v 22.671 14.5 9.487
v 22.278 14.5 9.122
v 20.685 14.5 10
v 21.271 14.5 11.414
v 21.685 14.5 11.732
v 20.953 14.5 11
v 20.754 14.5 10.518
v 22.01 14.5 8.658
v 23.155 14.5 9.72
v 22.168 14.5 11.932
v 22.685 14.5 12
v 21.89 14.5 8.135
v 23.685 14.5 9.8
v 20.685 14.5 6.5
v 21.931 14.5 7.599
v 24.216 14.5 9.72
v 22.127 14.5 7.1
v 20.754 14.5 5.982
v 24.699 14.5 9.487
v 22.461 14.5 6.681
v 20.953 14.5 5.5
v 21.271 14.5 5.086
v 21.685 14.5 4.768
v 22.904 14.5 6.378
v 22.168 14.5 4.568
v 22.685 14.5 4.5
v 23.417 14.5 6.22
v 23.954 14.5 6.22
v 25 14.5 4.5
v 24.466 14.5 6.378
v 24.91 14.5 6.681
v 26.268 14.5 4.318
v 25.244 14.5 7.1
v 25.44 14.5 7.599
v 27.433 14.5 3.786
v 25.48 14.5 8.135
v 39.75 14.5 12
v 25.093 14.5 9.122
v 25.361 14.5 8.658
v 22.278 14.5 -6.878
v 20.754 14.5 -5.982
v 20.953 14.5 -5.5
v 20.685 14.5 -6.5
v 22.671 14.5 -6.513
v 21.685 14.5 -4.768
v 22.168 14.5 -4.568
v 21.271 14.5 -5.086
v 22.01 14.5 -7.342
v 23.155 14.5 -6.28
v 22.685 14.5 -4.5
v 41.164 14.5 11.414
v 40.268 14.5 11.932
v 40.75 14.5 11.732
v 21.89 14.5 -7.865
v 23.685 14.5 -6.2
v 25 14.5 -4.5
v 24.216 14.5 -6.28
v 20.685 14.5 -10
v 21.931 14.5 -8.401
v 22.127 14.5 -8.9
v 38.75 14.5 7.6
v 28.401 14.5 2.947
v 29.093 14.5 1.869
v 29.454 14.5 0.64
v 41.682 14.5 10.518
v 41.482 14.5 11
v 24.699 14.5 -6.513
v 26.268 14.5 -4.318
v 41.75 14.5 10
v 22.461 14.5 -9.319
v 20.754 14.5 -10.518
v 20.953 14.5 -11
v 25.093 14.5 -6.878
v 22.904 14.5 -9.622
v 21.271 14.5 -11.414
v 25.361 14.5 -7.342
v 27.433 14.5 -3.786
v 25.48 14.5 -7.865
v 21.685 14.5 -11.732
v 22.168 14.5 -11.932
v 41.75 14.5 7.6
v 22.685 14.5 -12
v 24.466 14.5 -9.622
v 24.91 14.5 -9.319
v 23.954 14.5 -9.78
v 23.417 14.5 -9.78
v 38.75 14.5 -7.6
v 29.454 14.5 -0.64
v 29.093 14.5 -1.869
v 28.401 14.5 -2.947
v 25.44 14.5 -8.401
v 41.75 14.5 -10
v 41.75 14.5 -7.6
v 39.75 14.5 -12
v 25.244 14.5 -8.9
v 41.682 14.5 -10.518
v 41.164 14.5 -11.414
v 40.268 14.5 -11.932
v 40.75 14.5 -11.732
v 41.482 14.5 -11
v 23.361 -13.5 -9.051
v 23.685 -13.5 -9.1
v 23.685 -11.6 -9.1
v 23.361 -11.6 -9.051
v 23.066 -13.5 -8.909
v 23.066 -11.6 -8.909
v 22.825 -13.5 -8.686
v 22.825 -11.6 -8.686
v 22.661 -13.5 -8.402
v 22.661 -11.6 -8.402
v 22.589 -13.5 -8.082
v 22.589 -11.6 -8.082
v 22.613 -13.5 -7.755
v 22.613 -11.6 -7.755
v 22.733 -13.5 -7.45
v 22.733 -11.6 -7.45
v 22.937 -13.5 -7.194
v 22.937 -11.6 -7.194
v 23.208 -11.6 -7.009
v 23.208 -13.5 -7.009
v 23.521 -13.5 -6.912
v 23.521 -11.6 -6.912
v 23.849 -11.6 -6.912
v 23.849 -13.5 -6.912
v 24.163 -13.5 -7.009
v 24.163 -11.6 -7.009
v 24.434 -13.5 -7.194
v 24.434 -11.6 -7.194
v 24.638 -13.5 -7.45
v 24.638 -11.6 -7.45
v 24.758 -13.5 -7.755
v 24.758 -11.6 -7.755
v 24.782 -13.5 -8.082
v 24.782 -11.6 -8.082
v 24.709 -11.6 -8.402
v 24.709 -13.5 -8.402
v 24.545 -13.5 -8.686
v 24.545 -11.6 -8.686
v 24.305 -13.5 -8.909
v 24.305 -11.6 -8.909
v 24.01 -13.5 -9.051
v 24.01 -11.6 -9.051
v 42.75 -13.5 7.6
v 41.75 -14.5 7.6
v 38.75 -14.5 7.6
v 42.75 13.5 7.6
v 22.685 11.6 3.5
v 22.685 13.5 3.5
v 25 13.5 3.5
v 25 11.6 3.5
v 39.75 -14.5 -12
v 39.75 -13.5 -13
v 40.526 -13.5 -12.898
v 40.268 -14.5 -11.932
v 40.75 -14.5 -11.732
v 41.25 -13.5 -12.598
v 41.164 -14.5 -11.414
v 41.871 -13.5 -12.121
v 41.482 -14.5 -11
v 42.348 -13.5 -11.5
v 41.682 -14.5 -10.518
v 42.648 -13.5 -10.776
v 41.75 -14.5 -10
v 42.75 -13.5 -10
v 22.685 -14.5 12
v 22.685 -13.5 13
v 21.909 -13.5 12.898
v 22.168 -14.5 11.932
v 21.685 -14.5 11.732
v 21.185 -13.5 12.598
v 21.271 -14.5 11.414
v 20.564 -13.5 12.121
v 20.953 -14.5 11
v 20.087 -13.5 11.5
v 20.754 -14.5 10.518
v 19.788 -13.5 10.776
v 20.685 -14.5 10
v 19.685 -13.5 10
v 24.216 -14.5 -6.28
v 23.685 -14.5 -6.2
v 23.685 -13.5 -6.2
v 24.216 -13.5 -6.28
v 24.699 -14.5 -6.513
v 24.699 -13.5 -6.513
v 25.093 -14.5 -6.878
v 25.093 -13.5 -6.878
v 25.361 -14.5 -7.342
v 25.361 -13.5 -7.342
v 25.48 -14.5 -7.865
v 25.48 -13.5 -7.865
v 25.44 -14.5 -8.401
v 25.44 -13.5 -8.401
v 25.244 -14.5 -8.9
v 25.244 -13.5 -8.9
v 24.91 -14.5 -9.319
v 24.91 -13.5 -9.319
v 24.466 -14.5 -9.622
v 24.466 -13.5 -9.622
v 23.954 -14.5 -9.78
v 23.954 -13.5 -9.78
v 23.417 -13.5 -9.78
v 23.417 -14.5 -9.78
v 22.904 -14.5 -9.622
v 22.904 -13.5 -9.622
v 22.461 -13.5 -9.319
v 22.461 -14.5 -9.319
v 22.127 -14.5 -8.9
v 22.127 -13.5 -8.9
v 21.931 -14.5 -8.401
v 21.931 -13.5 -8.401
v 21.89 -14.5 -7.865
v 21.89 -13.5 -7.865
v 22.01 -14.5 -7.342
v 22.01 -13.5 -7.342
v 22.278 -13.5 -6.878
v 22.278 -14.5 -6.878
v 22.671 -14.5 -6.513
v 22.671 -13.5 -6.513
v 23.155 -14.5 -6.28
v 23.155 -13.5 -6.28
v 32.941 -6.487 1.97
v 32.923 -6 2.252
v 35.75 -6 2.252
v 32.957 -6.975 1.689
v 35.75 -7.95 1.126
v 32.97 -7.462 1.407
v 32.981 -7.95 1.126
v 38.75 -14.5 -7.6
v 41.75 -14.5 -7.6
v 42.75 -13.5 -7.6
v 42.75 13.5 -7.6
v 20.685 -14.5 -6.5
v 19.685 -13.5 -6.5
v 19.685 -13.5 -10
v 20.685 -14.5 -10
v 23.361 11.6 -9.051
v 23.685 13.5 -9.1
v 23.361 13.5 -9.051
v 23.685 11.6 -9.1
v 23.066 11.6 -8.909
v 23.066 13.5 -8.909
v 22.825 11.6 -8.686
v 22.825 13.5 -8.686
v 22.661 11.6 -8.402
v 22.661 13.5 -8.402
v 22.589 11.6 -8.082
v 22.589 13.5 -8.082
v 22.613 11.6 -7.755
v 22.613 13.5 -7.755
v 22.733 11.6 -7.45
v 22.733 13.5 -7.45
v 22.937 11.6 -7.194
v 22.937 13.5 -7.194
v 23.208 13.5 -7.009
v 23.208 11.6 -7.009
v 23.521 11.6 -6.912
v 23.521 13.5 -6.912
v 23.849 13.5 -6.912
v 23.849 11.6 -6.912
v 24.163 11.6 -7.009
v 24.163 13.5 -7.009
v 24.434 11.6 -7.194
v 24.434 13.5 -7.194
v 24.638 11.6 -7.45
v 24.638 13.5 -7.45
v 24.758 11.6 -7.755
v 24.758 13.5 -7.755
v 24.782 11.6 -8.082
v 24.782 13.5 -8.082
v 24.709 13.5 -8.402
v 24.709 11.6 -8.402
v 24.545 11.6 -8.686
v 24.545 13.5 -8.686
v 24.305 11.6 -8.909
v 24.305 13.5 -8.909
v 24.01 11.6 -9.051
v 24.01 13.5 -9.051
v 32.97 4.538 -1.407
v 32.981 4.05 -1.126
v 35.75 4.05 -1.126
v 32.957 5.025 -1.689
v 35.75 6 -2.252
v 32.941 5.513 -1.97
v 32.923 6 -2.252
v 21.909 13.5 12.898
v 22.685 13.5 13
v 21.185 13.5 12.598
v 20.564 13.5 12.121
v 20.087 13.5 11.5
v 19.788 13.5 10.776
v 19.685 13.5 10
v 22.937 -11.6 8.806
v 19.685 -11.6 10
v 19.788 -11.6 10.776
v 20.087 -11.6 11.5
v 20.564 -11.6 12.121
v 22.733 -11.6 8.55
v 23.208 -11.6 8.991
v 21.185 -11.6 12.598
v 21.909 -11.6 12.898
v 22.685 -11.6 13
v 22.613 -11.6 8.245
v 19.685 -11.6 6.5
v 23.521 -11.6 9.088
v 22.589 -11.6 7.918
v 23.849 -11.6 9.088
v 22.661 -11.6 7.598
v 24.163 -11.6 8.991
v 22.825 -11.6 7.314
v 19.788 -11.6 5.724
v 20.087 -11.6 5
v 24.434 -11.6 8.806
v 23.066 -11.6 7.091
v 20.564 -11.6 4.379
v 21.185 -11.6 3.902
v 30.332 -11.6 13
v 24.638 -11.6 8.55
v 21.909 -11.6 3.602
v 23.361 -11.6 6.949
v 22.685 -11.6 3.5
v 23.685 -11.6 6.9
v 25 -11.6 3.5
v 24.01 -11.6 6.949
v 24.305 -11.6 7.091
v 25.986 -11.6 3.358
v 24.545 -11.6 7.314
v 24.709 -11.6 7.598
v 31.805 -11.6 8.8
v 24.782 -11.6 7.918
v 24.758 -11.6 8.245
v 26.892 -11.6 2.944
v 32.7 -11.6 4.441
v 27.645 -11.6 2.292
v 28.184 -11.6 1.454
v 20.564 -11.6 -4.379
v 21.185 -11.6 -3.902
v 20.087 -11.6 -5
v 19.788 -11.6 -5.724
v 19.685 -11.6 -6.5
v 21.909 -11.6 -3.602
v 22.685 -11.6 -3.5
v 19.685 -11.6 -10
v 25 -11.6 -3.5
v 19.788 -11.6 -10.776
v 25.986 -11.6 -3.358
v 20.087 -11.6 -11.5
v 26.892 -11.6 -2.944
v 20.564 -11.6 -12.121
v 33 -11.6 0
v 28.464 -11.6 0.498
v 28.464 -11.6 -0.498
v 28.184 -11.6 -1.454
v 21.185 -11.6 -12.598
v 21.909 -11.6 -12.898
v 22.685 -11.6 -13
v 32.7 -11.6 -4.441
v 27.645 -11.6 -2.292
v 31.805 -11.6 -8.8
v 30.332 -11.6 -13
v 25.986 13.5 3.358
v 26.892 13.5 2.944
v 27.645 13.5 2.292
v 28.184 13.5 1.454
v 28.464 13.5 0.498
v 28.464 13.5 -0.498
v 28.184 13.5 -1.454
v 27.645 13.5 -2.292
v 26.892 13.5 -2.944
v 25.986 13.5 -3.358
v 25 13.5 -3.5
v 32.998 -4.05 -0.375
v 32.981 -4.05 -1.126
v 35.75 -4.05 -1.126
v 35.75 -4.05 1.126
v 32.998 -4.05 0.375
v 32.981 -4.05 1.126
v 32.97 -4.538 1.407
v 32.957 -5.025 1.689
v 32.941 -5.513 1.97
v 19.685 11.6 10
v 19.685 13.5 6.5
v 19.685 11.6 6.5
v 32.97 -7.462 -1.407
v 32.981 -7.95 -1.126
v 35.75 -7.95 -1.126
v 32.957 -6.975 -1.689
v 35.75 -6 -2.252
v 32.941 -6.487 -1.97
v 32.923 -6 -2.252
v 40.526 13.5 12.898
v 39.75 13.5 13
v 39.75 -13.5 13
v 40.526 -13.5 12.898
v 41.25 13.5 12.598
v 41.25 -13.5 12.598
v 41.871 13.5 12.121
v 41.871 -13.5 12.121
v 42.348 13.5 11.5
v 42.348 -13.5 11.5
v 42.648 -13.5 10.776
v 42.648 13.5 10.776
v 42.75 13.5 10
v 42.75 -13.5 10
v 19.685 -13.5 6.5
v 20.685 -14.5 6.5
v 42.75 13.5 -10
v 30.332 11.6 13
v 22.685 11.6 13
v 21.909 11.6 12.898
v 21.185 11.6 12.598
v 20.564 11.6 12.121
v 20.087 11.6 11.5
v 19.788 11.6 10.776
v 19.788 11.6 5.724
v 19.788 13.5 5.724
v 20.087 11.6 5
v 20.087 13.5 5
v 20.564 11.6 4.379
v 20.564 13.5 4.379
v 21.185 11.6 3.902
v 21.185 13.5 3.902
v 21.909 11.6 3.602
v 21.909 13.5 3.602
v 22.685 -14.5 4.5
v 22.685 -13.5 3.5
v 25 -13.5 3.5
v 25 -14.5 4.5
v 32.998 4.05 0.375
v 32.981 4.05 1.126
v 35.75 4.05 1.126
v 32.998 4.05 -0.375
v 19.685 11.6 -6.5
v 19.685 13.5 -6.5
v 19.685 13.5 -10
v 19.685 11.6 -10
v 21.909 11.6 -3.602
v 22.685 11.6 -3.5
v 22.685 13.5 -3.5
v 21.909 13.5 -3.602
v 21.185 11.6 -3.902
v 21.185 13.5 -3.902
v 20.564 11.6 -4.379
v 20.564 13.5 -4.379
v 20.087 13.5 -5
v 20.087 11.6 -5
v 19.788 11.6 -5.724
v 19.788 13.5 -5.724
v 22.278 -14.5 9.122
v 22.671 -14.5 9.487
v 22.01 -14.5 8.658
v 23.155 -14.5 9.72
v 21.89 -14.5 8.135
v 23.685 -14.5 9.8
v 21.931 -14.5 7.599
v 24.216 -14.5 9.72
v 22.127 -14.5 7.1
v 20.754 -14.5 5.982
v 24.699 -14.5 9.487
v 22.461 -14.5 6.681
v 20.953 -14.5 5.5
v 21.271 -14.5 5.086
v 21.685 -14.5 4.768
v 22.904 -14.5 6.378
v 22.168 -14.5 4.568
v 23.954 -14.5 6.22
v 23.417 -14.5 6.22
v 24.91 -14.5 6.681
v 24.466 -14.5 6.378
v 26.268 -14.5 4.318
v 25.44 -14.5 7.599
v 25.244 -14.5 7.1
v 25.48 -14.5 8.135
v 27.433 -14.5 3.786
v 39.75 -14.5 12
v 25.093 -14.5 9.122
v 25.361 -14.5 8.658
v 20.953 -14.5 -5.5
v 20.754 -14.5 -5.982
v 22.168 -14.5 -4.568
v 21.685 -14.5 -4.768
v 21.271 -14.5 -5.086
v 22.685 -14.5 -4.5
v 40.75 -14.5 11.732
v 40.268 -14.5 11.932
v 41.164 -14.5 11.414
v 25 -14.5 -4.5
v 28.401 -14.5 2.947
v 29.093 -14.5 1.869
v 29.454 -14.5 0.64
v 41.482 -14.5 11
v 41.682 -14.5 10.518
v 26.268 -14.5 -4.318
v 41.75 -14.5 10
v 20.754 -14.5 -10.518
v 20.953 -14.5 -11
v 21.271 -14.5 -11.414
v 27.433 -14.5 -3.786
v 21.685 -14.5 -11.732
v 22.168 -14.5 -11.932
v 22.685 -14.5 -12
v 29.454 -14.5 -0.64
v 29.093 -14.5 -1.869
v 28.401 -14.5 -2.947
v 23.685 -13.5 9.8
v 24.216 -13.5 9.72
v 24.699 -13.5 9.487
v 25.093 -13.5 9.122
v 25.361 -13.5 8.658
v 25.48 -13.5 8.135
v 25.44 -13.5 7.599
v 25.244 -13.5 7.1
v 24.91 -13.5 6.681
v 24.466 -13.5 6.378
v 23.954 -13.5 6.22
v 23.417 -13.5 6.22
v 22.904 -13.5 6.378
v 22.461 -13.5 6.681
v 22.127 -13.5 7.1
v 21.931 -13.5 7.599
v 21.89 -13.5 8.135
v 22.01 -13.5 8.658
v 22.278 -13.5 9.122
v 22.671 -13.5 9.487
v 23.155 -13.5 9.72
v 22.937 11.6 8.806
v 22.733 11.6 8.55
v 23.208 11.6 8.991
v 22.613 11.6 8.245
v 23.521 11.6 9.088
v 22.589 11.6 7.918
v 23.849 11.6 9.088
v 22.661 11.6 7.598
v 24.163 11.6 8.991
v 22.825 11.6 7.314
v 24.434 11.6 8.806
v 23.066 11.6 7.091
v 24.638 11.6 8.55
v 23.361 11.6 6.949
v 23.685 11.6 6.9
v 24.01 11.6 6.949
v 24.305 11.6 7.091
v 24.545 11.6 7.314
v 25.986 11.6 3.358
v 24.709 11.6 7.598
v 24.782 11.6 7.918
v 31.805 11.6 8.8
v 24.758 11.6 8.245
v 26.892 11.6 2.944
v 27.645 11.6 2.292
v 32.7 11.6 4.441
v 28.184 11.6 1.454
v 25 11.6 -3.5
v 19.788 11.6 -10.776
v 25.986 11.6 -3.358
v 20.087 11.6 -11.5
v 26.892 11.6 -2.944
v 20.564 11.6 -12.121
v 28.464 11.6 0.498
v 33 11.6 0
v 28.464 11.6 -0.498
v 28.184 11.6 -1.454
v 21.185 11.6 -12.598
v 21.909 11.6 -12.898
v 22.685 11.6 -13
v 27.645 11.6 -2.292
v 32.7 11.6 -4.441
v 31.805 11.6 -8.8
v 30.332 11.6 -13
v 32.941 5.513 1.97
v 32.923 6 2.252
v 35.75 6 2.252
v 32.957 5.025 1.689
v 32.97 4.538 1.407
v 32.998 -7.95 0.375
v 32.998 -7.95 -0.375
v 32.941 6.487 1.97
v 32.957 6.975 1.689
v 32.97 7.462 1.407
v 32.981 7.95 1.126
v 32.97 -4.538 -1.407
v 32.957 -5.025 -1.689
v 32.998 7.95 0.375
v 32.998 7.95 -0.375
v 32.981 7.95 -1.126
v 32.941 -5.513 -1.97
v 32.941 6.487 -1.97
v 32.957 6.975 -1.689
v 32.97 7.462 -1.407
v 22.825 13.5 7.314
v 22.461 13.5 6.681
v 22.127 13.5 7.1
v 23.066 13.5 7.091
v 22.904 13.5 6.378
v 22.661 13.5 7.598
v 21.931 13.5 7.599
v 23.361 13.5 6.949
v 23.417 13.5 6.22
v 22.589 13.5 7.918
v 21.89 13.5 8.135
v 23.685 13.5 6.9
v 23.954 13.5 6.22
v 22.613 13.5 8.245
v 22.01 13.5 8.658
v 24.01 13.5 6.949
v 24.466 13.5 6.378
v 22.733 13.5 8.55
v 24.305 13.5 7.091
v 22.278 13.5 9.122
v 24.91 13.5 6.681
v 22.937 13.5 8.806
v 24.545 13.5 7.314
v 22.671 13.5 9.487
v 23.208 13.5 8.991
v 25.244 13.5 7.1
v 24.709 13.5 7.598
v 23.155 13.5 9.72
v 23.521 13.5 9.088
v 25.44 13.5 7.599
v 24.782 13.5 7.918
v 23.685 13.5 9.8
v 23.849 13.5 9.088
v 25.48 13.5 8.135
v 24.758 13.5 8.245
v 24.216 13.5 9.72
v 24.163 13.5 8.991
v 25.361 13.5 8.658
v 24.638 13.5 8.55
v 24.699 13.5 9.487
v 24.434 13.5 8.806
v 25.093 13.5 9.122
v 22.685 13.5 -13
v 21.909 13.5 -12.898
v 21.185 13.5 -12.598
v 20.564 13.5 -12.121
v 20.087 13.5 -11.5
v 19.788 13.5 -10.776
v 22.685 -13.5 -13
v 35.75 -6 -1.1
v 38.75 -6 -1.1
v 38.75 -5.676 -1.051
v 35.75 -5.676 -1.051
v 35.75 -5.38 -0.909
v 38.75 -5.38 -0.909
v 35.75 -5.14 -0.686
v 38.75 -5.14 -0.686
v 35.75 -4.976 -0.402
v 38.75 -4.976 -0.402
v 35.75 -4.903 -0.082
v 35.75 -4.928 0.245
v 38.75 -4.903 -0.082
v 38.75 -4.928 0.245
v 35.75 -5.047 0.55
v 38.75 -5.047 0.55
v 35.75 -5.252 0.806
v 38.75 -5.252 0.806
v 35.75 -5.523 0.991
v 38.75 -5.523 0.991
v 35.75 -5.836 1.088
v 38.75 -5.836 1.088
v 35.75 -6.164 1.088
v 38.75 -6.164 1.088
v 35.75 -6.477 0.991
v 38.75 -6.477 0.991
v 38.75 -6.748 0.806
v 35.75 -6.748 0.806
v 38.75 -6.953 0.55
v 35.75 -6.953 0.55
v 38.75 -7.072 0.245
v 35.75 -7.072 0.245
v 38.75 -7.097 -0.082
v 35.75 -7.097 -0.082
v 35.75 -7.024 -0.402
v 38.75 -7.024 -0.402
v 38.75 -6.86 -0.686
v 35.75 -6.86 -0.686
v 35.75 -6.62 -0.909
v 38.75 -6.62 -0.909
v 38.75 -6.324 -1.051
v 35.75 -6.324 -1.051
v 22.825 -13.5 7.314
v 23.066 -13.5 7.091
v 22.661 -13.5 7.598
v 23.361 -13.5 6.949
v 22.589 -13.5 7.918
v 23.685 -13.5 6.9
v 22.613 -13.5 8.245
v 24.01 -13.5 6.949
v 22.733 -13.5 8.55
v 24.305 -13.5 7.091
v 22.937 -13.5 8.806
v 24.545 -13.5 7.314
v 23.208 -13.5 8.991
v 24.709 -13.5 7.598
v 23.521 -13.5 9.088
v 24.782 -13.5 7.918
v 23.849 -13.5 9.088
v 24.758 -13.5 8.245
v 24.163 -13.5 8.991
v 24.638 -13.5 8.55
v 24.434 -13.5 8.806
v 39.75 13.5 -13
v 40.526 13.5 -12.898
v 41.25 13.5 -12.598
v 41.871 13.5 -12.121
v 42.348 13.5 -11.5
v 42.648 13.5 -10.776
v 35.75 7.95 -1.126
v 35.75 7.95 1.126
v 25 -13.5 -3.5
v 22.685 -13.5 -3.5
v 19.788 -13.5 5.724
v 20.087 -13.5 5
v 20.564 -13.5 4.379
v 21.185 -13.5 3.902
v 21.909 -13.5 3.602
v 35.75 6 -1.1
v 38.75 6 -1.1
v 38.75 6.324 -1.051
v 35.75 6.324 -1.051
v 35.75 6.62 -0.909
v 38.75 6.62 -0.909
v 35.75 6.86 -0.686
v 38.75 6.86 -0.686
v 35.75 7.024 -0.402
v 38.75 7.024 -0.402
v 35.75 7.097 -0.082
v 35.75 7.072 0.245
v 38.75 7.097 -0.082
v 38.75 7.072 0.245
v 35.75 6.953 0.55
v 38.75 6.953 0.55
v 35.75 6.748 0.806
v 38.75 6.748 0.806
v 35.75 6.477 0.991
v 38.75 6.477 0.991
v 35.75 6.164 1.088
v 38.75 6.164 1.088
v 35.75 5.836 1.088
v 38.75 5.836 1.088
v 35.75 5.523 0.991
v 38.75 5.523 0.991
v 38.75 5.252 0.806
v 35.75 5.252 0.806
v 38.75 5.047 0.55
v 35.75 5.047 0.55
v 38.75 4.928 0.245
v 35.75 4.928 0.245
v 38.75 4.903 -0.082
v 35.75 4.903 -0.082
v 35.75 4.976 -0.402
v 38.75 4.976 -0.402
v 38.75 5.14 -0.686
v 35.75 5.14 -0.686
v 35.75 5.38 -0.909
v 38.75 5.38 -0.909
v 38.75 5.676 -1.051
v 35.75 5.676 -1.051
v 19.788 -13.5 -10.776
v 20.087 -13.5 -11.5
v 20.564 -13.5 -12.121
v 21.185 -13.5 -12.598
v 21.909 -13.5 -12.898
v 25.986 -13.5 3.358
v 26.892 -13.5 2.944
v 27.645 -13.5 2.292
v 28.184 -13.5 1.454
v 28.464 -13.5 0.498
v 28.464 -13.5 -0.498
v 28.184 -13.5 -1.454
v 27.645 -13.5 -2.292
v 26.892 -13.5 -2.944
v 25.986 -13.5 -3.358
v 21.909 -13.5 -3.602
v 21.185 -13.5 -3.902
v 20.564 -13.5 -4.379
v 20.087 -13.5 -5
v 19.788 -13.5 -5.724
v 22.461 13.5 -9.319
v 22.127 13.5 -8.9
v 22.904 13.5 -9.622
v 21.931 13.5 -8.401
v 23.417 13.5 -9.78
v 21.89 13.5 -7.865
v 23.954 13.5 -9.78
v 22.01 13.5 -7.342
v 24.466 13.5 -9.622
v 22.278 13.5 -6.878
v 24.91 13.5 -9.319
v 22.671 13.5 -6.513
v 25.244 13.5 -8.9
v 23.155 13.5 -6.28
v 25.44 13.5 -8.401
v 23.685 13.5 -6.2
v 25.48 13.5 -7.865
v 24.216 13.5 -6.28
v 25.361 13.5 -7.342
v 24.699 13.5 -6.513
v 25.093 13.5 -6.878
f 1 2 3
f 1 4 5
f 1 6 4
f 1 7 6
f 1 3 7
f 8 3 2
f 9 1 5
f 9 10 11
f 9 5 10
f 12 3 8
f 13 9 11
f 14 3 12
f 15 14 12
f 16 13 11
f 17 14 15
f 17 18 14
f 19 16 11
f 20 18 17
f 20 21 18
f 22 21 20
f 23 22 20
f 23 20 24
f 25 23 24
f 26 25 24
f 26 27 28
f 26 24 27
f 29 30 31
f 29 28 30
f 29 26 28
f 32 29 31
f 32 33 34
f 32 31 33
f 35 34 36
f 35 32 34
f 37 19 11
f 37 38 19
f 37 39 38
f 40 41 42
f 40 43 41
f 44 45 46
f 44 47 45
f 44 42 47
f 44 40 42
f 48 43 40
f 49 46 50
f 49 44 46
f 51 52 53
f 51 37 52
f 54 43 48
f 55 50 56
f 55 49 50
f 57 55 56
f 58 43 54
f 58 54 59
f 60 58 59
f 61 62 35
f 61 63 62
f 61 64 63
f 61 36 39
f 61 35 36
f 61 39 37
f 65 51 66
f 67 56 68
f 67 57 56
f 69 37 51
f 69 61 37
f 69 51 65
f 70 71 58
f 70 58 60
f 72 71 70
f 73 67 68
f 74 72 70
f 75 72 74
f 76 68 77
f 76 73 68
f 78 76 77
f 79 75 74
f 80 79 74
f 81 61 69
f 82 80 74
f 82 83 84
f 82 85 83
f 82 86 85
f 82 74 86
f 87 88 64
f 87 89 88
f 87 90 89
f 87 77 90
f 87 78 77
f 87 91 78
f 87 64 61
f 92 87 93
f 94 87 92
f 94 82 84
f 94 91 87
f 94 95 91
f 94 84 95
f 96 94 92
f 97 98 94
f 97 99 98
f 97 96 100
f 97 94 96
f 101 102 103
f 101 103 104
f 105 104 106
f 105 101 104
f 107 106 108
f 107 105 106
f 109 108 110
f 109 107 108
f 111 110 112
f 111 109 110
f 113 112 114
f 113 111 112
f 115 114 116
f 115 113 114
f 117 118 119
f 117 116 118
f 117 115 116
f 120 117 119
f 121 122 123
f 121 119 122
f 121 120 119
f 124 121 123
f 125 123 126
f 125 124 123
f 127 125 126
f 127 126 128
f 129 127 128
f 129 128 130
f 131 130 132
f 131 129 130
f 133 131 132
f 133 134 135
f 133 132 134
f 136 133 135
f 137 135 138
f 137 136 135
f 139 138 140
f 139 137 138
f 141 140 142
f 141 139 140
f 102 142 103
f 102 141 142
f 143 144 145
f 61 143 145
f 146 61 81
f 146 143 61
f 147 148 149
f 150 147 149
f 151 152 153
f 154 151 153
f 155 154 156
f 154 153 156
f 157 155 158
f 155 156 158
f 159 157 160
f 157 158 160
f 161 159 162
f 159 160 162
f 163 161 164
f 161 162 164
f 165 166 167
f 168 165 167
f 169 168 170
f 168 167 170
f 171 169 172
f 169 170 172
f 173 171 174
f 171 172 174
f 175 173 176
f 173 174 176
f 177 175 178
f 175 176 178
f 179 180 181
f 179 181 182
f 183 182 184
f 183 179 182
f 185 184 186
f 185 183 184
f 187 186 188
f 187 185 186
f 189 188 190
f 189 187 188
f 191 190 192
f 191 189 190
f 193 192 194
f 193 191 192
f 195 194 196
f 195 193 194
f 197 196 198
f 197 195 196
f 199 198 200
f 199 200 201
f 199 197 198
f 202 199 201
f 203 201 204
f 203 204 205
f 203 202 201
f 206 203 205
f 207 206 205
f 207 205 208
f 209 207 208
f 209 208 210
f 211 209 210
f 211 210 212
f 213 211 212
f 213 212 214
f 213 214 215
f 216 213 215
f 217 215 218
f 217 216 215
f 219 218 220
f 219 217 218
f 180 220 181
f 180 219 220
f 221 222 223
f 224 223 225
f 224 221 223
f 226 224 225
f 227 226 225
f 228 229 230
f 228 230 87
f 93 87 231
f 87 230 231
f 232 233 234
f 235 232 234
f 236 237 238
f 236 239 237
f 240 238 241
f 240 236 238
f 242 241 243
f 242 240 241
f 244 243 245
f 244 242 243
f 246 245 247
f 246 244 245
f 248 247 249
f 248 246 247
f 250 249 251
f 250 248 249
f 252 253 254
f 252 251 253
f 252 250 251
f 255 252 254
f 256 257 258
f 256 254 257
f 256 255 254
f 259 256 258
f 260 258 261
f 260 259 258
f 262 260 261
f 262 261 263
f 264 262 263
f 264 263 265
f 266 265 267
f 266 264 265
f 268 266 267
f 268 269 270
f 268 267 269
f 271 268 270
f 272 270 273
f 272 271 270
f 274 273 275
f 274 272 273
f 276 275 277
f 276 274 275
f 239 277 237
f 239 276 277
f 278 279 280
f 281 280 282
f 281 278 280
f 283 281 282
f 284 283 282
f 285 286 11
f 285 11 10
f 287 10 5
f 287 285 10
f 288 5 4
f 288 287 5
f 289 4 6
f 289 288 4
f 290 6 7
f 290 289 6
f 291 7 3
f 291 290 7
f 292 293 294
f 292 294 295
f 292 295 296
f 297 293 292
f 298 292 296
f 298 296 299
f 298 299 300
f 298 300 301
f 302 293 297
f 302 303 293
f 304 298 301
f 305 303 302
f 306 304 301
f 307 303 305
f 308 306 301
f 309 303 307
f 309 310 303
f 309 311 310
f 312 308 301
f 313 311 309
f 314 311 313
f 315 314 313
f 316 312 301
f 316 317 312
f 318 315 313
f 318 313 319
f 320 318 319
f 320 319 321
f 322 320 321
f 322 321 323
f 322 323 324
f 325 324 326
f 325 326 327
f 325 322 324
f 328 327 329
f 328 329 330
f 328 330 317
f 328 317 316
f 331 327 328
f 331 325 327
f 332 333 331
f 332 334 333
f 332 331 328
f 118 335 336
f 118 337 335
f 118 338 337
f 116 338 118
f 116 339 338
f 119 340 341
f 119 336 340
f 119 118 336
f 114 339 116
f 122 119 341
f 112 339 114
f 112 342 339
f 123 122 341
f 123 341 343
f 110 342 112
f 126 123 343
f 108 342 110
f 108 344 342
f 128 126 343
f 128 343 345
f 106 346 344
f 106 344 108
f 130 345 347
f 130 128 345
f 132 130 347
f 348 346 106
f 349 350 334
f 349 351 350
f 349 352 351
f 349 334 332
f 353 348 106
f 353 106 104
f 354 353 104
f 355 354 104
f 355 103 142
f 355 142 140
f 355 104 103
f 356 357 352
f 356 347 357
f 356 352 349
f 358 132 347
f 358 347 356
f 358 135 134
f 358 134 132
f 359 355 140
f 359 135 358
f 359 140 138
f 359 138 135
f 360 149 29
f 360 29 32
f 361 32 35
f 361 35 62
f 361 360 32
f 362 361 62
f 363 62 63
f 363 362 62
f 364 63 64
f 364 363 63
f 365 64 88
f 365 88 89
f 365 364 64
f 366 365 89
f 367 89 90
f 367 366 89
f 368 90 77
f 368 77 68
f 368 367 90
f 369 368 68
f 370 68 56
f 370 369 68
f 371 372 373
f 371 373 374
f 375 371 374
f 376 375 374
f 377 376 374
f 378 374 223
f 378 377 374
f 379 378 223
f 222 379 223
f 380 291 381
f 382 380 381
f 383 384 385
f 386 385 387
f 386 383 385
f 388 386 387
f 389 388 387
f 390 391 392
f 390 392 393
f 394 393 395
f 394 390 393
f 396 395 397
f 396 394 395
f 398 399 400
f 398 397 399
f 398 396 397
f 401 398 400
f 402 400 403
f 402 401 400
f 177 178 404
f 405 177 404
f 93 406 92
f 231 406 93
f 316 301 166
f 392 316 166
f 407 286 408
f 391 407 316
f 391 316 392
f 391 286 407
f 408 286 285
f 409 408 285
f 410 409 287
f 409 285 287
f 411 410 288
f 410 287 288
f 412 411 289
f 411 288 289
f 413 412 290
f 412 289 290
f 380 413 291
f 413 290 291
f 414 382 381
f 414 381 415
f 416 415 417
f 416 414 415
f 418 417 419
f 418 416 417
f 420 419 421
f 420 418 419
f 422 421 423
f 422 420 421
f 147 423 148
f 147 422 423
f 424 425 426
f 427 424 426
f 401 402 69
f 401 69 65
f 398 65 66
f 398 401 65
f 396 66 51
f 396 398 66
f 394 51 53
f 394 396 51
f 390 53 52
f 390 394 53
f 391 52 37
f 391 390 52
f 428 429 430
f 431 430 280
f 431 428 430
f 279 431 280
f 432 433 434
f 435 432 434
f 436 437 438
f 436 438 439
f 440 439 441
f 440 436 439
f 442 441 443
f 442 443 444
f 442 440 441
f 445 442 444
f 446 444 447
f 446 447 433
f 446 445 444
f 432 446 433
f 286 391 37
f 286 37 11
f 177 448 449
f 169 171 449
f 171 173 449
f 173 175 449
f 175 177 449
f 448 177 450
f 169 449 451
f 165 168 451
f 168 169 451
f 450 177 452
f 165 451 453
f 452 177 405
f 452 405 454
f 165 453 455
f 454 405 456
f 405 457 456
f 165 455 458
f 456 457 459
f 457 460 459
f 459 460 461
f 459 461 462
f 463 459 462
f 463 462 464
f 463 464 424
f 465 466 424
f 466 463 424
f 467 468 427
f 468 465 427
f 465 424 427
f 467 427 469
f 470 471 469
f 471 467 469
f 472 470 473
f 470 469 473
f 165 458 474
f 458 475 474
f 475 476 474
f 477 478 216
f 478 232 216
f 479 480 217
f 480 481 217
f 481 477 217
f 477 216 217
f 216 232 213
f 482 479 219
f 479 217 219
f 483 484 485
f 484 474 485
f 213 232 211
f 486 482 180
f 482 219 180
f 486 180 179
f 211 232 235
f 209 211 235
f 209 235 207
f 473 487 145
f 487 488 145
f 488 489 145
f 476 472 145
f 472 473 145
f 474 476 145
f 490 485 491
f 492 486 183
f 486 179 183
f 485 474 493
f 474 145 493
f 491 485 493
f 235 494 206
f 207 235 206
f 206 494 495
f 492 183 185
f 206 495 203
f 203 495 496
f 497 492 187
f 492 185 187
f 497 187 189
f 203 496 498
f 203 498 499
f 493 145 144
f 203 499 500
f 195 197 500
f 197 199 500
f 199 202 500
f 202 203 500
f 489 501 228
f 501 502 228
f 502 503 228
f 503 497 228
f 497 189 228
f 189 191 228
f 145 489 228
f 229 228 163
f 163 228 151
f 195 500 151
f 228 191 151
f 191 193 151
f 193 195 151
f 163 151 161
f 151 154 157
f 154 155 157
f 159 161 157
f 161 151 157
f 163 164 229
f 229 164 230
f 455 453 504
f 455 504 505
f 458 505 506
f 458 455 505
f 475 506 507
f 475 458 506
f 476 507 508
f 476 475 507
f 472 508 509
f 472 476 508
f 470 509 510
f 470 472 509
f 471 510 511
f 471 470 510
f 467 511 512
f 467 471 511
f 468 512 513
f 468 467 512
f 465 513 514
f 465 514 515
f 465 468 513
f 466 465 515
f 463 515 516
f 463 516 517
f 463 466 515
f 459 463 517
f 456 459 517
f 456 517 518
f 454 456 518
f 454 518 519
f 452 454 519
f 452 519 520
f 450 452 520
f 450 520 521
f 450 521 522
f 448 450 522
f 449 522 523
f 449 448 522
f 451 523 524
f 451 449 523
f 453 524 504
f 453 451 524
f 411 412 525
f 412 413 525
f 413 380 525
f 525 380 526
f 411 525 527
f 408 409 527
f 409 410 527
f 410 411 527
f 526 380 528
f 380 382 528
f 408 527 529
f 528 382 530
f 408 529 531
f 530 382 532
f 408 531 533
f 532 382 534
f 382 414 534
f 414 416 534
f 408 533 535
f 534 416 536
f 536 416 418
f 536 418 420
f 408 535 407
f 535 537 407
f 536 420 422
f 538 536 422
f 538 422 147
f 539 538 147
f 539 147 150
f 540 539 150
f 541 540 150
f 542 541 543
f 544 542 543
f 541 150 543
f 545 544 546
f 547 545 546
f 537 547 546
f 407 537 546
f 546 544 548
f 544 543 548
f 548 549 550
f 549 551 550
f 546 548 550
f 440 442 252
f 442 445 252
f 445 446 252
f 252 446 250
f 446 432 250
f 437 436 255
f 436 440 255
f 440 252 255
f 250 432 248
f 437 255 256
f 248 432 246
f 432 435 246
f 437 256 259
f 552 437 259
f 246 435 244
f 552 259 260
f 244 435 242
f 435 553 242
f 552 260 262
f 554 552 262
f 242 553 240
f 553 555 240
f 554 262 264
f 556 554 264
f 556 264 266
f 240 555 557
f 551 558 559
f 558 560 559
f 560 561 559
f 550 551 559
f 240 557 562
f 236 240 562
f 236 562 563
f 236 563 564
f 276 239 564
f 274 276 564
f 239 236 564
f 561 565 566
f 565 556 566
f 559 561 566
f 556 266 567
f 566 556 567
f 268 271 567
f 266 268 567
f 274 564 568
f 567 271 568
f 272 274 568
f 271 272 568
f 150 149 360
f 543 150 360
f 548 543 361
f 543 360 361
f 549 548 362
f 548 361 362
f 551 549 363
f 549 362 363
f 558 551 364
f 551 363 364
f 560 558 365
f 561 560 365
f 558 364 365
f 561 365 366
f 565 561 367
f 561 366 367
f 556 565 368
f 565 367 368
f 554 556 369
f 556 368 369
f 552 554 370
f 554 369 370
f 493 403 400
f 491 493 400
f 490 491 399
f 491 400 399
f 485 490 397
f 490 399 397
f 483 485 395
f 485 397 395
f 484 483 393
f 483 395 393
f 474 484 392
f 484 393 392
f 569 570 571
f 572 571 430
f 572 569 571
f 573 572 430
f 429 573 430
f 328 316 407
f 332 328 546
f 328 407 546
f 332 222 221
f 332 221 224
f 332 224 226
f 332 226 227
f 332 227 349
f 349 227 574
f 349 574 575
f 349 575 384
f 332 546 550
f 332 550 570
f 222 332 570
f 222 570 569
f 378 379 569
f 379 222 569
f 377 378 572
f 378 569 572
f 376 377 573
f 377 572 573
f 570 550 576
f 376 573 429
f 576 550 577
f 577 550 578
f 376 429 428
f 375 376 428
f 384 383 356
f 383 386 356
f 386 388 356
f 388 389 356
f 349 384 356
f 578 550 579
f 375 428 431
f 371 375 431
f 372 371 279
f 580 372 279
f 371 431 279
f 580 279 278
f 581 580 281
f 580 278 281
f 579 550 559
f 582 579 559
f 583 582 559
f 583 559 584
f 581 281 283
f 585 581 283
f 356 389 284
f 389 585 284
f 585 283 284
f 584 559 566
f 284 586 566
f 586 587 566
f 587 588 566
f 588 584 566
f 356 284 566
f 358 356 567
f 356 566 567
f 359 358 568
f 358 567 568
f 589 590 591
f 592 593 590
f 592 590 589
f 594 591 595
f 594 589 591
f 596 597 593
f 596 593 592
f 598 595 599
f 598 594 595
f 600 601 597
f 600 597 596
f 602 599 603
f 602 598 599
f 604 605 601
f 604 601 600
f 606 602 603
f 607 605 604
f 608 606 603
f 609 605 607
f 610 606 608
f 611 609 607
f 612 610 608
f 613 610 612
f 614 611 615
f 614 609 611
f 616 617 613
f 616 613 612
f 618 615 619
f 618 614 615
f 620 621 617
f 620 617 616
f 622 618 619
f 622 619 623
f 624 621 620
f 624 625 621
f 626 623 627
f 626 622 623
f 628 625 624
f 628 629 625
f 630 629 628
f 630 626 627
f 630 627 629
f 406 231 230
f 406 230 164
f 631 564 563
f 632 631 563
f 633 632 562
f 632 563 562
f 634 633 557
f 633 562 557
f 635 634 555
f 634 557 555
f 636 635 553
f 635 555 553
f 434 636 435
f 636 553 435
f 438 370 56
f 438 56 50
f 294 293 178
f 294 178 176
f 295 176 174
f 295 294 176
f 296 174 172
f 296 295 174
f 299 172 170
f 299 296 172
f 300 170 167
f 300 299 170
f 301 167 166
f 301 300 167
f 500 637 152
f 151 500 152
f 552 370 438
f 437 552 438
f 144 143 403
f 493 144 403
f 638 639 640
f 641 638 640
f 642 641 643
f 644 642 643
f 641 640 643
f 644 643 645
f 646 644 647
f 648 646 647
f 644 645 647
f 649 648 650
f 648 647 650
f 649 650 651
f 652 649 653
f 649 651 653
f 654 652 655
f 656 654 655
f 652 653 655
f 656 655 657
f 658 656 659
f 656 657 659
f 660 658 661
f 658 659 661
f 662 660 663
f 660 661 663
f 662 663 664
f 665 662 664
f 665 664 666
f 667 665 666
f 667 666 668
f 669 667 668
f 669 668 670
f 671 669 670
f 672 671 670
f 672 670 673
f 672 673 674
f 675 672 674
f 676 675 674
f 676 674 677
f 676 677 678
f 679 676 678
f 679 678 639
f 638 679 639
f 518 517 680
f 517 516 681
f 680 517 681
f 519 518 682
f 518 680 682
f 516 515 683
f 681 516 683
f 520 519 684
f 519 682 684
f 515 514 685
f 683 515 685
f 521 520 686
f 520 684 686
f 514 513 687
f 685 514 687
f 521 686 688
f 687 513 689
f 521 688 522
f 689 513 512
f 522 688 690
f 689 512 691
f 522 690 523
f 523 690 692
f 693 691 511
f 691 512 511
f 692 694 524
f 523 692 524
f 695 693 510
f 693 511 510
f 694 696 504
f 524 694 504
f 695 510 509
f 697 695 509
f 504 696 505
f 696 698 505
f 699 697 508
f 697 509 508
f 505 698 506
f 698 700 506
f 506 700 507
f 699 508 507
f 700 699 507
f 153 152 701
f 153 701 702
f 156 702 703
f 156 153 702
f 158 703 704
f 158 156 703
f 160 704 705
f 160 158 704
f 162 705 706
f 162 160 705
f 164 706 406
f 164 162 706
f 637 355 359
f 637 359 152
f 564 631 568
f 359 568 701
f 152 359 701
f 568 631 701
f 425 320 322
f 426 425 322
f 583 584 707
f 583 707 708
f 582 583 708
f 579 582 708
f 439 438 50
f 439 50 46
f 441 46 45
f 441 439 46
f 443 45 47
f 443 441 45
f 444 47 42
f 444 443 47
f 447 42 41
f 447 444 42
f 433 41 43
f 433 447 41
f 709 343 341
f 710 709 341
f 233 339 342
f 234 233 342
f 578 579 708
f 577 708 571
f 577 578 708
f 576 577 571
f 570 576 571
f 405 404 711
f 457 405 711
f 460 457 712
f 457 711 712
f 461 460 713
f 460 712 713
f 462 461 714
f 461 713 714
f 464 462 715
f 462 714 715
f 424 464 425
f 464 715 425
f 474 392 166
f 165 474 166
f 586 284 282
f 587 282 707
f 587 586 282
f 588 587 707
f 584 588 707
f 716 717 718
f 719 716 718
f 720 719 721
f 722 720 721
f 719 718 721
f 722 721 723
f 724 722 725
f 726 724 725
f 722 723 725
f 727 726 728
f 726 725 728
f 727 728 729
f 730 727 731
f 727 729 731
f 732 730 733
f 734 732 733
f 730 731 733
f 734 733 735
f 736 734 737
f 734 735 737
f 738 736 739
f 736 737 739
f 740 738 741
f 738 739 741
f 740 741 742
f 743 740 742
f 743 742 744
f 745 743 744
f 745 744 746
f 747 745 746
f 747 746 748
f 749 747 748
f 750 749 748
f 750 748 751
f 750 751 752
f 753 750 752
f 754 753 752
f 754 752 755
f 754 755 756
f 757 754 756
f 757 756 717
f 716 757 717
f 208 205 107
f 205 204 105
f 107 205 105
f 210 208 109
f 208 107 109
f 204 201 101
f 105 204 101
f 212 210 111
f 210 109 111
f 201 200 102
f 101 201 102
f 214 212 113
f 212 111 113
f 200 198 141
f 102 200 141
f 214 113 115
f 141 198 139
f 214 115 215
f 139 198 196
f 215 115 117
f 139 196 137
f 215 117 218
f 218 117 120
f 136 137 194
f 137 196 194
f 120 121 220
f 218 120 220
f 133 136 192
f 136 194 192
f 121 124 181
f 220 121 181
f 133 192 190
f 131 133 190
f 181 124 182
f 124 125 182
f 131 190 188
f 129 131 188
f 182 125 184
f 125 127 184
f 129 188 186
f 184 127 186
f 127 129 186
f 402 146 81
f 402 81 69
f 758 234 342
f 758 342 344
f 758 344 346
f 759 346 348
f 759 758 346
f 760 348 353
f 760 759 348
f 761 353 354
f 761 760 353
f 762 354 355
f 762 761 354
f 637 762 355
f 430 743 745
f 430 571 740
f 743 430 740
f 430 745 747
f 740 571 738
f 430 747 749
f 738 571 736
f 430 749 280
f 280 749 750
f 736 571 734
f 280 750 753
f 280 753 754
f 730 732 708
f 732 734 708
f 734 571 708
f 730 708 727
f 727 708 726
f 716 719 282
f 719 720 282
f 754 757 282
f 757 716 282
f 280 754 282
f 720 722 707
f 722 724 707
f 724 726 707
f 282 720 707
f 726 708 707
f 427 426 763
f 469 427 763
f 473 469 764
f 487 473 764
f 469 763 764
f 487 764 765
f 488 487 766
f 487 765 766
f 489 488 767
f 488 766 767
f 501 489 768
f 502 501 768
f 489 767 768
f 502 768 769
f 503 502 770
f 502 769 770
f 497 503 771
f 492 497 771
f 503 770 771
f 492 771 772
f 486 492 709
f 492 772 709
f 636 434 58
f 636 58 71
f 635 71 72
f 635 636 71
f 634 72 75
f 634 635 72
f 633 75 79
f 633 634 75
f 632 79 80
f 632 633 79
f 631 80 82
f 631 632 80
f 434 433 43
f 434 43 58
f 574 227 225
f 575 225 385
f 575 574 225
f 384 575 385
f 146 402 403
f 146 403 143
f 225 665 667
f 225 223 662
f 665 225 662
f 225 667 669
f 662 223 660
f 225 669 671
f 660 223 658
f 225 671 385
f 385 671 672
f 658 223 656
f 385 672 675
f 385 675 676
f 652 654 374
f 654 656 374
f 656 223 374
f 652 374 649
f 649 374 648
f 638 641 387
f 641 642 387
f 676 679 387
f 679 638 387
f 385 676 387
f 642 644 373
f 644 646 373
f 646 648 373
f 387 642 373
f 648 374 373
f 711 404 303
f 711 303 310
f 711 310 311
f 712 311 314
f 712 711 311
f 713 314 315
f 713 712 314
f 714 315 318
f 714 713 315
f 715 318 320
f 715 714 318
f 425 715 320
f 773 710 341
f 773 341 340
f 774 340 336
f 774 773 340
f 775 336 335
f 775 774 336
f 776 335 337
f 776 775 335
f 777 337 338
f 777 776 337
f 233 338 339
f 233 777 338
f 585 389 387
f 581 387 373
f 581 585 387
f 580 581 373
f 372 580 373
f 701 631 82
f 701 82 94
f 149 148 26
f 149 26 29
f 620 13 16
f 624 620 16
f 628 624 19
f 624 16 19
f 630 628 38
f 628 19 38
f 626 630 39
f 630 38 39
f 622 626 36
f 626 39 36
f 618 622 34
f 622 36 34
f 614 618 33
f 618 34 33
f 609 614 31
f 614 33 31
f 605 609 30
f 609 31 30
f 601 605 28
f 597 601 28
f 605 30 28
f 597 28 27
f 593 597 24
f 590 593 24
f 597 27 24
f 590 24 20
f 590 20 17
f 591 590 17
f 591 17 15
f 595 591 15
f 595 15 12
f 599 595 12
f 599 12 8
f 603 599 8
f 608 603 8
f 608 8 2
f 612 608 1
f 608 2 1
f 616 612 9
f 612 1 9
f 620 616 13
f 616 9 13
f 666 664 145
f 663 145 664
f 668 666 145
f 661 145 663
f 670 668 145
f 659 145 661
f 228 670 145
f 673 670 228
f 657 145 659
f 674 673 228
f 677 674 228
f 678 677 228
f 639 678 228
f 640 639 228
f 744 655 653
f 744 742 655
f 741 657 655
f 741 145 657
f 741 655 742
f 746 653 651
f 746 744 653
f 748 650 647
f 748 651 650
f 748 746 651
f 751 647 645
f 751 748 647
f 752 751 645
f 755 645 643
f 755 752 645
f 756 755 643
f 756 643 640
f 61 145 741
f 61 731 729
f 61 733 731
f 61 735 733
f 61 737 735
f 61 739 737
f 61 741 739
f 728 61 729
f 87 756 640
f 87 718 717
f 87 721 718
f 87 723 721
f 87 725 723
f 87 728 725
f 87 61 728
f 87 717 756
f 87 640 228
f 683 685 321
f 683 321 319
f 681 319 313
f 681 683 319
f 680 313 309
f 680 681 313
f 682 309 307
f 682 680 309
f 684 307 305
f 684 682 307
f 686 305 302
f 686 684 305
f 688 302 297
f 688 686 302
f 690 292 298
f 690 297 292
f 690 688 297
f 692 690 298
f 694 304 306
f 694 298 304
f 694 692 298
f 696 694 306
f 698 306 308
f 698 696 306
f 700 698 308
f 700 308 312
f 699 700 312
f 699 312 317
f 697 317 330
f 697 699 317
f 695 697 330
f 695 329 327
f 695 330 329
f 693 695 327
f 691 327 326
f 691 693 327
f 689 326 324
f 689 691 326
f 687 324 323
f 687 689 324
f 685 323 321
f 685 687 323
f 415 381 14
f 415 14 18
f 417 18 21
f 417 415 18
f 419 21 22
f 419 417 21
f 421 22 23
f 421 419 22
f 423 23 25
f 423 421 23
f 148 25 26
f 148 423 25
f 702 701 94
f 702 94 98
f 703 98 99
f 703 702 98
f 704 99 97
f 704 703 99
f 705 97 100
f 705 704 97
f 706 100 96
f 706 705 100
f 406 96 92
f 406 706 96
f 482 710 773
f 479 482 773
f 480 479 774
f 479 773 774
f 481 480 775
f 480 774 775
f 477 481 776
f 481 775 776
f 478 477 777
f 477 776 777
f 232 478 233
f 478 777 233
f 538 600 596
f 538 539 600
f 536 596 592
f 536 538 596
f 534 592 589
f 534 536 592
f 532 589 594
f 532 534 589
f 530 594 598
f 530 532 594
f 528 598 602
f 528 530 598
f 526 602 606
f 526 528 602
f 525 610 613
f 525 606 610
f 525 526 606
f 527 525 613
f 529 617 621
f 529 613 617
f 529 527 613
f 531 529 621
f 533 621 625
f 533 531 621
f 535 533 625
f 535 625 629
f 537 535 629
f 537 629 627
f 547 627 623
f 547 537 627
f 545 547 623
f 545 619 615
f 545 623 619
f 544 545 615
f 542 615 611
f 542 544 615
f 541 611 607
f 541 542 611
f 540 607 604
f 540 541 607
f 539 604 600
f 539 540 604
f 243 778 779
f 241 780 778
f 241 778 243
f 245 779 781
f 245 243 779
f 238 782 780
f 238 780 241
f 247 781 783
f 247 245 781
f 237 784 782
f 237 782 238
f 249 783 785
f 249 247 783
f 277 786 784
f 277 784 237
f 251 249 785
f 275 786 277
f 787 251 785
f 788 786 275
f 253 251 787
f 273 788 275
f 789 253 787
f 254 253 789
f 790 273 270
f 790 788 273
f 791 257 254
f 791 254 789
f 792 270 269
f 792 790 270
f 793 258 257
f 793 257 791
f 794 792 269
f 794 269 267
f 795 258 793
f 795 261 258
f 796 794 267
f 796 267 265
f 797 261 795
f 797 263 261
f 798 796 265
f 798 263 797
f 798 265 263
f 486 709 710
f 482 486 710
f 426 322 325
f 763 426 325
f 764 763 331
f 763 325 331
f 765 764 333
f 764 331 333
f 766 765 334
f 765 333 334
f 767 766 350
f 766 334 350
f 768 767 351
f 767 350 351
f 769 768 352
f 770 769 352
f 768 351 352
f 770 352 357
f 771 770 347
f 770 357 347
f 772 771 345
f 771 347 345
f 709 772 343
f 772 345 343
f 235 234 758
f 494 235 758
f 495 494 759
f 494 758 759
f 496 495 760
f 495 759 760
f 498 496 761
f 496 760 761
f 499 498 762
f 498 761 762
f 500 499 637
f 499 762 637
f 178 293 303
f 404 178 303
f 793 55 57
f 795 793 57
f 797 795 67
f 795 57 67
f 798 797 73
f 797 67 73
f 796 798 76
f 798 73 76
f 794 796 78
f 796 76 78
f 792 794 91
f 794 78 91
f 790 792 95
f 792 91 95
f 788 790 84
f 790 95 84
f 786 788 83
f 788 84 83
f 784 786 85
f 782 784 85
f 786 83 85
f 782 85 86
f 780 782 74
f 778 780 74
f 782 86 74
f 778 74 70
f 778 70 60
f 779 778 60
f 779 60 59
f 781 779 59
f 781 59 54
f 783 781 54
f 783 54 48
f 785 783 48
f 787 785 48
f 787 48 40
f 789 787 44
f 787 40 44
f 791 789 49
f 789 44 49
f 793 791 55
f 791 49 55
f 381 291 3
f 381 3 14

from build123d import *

# Parameters (mm, degrees)
SKETCH_2_W          = 23.064561435
SKETCH_2_H          = 26
SKETCH_2_R          = 1.1
EXTRUDE_1_DEPTH     = 14.5
SKETCH_3_R          = 33
CUT_EXTRUDE_1_DEPTH = 11.6
SKETCH_4_R          = 3.5
CUT_EXTRUDE_2_DEPTH = 54.268776032
SKETCH_5_W          = 15.2
SKETCH_5_H          = 29
CUT_EXTRUDE_3_DEPTH = 4
FILLET_1_R          = 3
SKETCH_6_R          = 1.1
CUT_EXTRUDE_4_DEPTH = 28.252660471
CHAMFER_1_SIZE      = 1
SKETCH_7_R          = 1.8
CUT_EXTRUDE_5_DEPTH = 1
CUT_EXTRUDE_6_DEPTH = 35.75


with BuildPart() as part:
    # Эскиз2 → Бобышка-Вытянуть1 (new, symmetric)
    with BuildSketch(Plane(origin=(0, 0, 0), x_dir=(1, 0, 0), z_dir=(0, 1, 0))):
        with Locations((31.217719282, 0)):
            Rectangle(SKETCH_2_W, SKETCH_2_H)
        with Locations(Location((23.685438565, 8, 0), (0, 0, 90))):
            Circle(SKETCH_2_R, mode=Mode.SUBTRACT)
        with Locations(Location((23.685438565, -8, 0), (0, 0, 90))):
            Circle(SKETCH_2_R, mode=Mode.SUBTRACT)
    extrude(amount=EXTRUDE_1_DEPTH, both=True)

    # Эскиз3 → Вырез-Вытянуть1 (cut, symmetric)
    with BuildSketch(Plane(origin=(0, 0, 0), x_dir=(1, 0, 0), z_dir=(0, 1, 0))):
        Circle(SKETCH_3_R)
    extrude(amount=CUT_EXTRUDE_1_DEPTH, both=True, mode=Mode.SUBTRACT)

    # Эскиз4 → Вырез-Вытянуть2 (cut, through all)
    with BuildSketch(Plane(origin=(0, 14.5, 0), x_dir=(1, 0, 0), z_dir=(0, 1, 0))):
        with Locations((25, 0)):
            Circle(SKETCH_4_R)
        with BuildLine():
            ThreePointArc((25, -3.5), (21.5, 0), (25, 3.5))
            Line((25, 3.5), (19.685438565, 3.5))
            Line((19.685438565, 3.5), (19.685438565, -3.5))
            Line((19.685438565, -3.5), (25, -3.5))
        make_face()
    extrude(amount=-CUT_EXTRUDE_2_DEPTH, mode=Mode.SUBTRACT)

    # Эскиз5 → Вырез-Вытянуть3 (cut)
    with BuildSketch(Plane(origin=(42.75, 0, 0), x_dir=(0, 0, -1), z_dir=(1, 0, 0))):
        Rectangle(SKETCH_5_W, SKETCH_5_H)
    extrude(amount=-CUT_EXTRUDE_3_DEPTH, mode=Mode.SUBTRACT)

    # Скругление1
    fillet_1_edges = [part.edges().sort_by_distance(p)[0] for p in [
        (19.685438565, -13.05, 13),
        (19.685438565, -13.05, -13),
        (19.685438565, 13.05, 3.5),
        (19.685438565, 13.05, -3.5),
        (19.685438565, -13.05, 3.5),
        (19.685438565, -13.05, -3.5),
        (42.75, 0, 13),
        (19.685438565, 13.05, 13),
        (19.685438565, 13.05, -13),
        (42.75, 0, -13),
    ]]
    fillet(fillet_1_edges, radius=FILLET_1_R)

    # Эскиз6 → Вырез-Вытянуть4 (cut, through all)
    with BuildSketch(Plane(origin=(38.75, 0, 0), x_dir=(0, 0, -1), z_dir=(1, 0, 0))):
        with Locations((0, 6)):
            Circle(SKETCH_6_R)
        with Locations((0, -6)):
            Circle(SKETCH_6_R)
    extrude(amount=-CUT_EXTRUDE_4_DEPTH, mode=Mode.SUBTRACT)

    # Фаска1
    chamfer_1_edges = [part.edges().sort_by_distance(p)[0] for p in [
        (20.564118221, 14.5, 12.121320344),
        (20.564118221, 14.5, 4.378679656),
        (20.564118221, 14.5, -4.378679656),
        (20.564118221, 14.5, -12.121320344),
        (41.871320344, 14.5, -12.121320344),
        (28.5, -14.5, 0),
        (23.842719282, -14.5, -3.5),
        (28.5, 14.5, 0),
        (23.842719282, 14.5, -3.5),
        (42.75, -14.5, -8.8),
        (42.75, 14.5, -8.8),
        (31.217719282, 14.5, -13),
        (31.217719282, -14.5, -13),
        (42.75, -14.5, 8.8),
        (31.217719282, -14.5, 13),
        (19.685438565, -14.5, 8.25),
        (23.842719282, -14.5, 3.5),
        (19.685438565, -14.5, -8.25),
        (41.871320344, -14.5, 12.121320344),
        (20.564118221, -14.5, 12.121320344),
        (20.564118221, -14.5, 4.378679656),
        (20.564118221, -14.5, -4.378679656),
        (20.564118221, -14.5, -12.121320344),
        (41.871320344, -14.5, -12.121320344),
        (19.685438565, 14.5, -8.25),
        (23.842719282, 14.5, 3.5),
        (19.685438565, 14.5, 8.25),
        (31.217719282, 14.5, 13),
        (42.75, 14.5, 8.8),
        (41.871320344, 14.5, 12.121320344),
    ]]
    chamfer(chamfer_1_edges, length=CHAMFER_1_SIZE)

    # Эскиз7 → Вырез-Вытянуть5 (cut)
    with BuildSketch(Plane(origin=(0, 14.5, 0), x_dir=(1, 0, 0), z_dir=(0, 1, 0))):
        with Locations(Location((23.685438565, 8, 0), (0, 0, 270))):
            Circle(SKETCH_7_R)
        with Locations(Location((23.685438565, -8, 0), (0, 0, 270))):
            Circle(SKETCH_7_R)
    cut_extrude_5 = extrude(amount=-CUT_EXTRUDE_5_DEPTH, mode=Mode.SUBTRACT)

    # Зеркальное отражение1: Вырез-Вытянуть5 across plane
    add(cut_extrude_5.mirror(Plane.ZX), mode=Mode.SUBTRACT)

    # Эскиз8 → Вырез-Вытянуть6 (cut)
    with BuildSketch(Plane(origin=(0, 0, 0), x_dir=(0, 0, -1), z_dir=(1, 0, 0))):
        Polygon((1.125833025, 4.05), (2.25166605, 6), (1.125833025, 7.95), (-1.125833025, 7.95), (-2.25166605, 6), (-1.125833025, 4.05), align=None)
        Polygon((1.125833025, -7.95), (2.25166605, -6), (1.125833025, -4.05), (-1.125833025, -4.05), (-2.25166605, -6), (-1.125833025, -7.95), align=None)
    extrude(amount=CUT_EXTRUDE_6_DEPTH, mode=Mode.SUBTRACT)


solid = part.part
